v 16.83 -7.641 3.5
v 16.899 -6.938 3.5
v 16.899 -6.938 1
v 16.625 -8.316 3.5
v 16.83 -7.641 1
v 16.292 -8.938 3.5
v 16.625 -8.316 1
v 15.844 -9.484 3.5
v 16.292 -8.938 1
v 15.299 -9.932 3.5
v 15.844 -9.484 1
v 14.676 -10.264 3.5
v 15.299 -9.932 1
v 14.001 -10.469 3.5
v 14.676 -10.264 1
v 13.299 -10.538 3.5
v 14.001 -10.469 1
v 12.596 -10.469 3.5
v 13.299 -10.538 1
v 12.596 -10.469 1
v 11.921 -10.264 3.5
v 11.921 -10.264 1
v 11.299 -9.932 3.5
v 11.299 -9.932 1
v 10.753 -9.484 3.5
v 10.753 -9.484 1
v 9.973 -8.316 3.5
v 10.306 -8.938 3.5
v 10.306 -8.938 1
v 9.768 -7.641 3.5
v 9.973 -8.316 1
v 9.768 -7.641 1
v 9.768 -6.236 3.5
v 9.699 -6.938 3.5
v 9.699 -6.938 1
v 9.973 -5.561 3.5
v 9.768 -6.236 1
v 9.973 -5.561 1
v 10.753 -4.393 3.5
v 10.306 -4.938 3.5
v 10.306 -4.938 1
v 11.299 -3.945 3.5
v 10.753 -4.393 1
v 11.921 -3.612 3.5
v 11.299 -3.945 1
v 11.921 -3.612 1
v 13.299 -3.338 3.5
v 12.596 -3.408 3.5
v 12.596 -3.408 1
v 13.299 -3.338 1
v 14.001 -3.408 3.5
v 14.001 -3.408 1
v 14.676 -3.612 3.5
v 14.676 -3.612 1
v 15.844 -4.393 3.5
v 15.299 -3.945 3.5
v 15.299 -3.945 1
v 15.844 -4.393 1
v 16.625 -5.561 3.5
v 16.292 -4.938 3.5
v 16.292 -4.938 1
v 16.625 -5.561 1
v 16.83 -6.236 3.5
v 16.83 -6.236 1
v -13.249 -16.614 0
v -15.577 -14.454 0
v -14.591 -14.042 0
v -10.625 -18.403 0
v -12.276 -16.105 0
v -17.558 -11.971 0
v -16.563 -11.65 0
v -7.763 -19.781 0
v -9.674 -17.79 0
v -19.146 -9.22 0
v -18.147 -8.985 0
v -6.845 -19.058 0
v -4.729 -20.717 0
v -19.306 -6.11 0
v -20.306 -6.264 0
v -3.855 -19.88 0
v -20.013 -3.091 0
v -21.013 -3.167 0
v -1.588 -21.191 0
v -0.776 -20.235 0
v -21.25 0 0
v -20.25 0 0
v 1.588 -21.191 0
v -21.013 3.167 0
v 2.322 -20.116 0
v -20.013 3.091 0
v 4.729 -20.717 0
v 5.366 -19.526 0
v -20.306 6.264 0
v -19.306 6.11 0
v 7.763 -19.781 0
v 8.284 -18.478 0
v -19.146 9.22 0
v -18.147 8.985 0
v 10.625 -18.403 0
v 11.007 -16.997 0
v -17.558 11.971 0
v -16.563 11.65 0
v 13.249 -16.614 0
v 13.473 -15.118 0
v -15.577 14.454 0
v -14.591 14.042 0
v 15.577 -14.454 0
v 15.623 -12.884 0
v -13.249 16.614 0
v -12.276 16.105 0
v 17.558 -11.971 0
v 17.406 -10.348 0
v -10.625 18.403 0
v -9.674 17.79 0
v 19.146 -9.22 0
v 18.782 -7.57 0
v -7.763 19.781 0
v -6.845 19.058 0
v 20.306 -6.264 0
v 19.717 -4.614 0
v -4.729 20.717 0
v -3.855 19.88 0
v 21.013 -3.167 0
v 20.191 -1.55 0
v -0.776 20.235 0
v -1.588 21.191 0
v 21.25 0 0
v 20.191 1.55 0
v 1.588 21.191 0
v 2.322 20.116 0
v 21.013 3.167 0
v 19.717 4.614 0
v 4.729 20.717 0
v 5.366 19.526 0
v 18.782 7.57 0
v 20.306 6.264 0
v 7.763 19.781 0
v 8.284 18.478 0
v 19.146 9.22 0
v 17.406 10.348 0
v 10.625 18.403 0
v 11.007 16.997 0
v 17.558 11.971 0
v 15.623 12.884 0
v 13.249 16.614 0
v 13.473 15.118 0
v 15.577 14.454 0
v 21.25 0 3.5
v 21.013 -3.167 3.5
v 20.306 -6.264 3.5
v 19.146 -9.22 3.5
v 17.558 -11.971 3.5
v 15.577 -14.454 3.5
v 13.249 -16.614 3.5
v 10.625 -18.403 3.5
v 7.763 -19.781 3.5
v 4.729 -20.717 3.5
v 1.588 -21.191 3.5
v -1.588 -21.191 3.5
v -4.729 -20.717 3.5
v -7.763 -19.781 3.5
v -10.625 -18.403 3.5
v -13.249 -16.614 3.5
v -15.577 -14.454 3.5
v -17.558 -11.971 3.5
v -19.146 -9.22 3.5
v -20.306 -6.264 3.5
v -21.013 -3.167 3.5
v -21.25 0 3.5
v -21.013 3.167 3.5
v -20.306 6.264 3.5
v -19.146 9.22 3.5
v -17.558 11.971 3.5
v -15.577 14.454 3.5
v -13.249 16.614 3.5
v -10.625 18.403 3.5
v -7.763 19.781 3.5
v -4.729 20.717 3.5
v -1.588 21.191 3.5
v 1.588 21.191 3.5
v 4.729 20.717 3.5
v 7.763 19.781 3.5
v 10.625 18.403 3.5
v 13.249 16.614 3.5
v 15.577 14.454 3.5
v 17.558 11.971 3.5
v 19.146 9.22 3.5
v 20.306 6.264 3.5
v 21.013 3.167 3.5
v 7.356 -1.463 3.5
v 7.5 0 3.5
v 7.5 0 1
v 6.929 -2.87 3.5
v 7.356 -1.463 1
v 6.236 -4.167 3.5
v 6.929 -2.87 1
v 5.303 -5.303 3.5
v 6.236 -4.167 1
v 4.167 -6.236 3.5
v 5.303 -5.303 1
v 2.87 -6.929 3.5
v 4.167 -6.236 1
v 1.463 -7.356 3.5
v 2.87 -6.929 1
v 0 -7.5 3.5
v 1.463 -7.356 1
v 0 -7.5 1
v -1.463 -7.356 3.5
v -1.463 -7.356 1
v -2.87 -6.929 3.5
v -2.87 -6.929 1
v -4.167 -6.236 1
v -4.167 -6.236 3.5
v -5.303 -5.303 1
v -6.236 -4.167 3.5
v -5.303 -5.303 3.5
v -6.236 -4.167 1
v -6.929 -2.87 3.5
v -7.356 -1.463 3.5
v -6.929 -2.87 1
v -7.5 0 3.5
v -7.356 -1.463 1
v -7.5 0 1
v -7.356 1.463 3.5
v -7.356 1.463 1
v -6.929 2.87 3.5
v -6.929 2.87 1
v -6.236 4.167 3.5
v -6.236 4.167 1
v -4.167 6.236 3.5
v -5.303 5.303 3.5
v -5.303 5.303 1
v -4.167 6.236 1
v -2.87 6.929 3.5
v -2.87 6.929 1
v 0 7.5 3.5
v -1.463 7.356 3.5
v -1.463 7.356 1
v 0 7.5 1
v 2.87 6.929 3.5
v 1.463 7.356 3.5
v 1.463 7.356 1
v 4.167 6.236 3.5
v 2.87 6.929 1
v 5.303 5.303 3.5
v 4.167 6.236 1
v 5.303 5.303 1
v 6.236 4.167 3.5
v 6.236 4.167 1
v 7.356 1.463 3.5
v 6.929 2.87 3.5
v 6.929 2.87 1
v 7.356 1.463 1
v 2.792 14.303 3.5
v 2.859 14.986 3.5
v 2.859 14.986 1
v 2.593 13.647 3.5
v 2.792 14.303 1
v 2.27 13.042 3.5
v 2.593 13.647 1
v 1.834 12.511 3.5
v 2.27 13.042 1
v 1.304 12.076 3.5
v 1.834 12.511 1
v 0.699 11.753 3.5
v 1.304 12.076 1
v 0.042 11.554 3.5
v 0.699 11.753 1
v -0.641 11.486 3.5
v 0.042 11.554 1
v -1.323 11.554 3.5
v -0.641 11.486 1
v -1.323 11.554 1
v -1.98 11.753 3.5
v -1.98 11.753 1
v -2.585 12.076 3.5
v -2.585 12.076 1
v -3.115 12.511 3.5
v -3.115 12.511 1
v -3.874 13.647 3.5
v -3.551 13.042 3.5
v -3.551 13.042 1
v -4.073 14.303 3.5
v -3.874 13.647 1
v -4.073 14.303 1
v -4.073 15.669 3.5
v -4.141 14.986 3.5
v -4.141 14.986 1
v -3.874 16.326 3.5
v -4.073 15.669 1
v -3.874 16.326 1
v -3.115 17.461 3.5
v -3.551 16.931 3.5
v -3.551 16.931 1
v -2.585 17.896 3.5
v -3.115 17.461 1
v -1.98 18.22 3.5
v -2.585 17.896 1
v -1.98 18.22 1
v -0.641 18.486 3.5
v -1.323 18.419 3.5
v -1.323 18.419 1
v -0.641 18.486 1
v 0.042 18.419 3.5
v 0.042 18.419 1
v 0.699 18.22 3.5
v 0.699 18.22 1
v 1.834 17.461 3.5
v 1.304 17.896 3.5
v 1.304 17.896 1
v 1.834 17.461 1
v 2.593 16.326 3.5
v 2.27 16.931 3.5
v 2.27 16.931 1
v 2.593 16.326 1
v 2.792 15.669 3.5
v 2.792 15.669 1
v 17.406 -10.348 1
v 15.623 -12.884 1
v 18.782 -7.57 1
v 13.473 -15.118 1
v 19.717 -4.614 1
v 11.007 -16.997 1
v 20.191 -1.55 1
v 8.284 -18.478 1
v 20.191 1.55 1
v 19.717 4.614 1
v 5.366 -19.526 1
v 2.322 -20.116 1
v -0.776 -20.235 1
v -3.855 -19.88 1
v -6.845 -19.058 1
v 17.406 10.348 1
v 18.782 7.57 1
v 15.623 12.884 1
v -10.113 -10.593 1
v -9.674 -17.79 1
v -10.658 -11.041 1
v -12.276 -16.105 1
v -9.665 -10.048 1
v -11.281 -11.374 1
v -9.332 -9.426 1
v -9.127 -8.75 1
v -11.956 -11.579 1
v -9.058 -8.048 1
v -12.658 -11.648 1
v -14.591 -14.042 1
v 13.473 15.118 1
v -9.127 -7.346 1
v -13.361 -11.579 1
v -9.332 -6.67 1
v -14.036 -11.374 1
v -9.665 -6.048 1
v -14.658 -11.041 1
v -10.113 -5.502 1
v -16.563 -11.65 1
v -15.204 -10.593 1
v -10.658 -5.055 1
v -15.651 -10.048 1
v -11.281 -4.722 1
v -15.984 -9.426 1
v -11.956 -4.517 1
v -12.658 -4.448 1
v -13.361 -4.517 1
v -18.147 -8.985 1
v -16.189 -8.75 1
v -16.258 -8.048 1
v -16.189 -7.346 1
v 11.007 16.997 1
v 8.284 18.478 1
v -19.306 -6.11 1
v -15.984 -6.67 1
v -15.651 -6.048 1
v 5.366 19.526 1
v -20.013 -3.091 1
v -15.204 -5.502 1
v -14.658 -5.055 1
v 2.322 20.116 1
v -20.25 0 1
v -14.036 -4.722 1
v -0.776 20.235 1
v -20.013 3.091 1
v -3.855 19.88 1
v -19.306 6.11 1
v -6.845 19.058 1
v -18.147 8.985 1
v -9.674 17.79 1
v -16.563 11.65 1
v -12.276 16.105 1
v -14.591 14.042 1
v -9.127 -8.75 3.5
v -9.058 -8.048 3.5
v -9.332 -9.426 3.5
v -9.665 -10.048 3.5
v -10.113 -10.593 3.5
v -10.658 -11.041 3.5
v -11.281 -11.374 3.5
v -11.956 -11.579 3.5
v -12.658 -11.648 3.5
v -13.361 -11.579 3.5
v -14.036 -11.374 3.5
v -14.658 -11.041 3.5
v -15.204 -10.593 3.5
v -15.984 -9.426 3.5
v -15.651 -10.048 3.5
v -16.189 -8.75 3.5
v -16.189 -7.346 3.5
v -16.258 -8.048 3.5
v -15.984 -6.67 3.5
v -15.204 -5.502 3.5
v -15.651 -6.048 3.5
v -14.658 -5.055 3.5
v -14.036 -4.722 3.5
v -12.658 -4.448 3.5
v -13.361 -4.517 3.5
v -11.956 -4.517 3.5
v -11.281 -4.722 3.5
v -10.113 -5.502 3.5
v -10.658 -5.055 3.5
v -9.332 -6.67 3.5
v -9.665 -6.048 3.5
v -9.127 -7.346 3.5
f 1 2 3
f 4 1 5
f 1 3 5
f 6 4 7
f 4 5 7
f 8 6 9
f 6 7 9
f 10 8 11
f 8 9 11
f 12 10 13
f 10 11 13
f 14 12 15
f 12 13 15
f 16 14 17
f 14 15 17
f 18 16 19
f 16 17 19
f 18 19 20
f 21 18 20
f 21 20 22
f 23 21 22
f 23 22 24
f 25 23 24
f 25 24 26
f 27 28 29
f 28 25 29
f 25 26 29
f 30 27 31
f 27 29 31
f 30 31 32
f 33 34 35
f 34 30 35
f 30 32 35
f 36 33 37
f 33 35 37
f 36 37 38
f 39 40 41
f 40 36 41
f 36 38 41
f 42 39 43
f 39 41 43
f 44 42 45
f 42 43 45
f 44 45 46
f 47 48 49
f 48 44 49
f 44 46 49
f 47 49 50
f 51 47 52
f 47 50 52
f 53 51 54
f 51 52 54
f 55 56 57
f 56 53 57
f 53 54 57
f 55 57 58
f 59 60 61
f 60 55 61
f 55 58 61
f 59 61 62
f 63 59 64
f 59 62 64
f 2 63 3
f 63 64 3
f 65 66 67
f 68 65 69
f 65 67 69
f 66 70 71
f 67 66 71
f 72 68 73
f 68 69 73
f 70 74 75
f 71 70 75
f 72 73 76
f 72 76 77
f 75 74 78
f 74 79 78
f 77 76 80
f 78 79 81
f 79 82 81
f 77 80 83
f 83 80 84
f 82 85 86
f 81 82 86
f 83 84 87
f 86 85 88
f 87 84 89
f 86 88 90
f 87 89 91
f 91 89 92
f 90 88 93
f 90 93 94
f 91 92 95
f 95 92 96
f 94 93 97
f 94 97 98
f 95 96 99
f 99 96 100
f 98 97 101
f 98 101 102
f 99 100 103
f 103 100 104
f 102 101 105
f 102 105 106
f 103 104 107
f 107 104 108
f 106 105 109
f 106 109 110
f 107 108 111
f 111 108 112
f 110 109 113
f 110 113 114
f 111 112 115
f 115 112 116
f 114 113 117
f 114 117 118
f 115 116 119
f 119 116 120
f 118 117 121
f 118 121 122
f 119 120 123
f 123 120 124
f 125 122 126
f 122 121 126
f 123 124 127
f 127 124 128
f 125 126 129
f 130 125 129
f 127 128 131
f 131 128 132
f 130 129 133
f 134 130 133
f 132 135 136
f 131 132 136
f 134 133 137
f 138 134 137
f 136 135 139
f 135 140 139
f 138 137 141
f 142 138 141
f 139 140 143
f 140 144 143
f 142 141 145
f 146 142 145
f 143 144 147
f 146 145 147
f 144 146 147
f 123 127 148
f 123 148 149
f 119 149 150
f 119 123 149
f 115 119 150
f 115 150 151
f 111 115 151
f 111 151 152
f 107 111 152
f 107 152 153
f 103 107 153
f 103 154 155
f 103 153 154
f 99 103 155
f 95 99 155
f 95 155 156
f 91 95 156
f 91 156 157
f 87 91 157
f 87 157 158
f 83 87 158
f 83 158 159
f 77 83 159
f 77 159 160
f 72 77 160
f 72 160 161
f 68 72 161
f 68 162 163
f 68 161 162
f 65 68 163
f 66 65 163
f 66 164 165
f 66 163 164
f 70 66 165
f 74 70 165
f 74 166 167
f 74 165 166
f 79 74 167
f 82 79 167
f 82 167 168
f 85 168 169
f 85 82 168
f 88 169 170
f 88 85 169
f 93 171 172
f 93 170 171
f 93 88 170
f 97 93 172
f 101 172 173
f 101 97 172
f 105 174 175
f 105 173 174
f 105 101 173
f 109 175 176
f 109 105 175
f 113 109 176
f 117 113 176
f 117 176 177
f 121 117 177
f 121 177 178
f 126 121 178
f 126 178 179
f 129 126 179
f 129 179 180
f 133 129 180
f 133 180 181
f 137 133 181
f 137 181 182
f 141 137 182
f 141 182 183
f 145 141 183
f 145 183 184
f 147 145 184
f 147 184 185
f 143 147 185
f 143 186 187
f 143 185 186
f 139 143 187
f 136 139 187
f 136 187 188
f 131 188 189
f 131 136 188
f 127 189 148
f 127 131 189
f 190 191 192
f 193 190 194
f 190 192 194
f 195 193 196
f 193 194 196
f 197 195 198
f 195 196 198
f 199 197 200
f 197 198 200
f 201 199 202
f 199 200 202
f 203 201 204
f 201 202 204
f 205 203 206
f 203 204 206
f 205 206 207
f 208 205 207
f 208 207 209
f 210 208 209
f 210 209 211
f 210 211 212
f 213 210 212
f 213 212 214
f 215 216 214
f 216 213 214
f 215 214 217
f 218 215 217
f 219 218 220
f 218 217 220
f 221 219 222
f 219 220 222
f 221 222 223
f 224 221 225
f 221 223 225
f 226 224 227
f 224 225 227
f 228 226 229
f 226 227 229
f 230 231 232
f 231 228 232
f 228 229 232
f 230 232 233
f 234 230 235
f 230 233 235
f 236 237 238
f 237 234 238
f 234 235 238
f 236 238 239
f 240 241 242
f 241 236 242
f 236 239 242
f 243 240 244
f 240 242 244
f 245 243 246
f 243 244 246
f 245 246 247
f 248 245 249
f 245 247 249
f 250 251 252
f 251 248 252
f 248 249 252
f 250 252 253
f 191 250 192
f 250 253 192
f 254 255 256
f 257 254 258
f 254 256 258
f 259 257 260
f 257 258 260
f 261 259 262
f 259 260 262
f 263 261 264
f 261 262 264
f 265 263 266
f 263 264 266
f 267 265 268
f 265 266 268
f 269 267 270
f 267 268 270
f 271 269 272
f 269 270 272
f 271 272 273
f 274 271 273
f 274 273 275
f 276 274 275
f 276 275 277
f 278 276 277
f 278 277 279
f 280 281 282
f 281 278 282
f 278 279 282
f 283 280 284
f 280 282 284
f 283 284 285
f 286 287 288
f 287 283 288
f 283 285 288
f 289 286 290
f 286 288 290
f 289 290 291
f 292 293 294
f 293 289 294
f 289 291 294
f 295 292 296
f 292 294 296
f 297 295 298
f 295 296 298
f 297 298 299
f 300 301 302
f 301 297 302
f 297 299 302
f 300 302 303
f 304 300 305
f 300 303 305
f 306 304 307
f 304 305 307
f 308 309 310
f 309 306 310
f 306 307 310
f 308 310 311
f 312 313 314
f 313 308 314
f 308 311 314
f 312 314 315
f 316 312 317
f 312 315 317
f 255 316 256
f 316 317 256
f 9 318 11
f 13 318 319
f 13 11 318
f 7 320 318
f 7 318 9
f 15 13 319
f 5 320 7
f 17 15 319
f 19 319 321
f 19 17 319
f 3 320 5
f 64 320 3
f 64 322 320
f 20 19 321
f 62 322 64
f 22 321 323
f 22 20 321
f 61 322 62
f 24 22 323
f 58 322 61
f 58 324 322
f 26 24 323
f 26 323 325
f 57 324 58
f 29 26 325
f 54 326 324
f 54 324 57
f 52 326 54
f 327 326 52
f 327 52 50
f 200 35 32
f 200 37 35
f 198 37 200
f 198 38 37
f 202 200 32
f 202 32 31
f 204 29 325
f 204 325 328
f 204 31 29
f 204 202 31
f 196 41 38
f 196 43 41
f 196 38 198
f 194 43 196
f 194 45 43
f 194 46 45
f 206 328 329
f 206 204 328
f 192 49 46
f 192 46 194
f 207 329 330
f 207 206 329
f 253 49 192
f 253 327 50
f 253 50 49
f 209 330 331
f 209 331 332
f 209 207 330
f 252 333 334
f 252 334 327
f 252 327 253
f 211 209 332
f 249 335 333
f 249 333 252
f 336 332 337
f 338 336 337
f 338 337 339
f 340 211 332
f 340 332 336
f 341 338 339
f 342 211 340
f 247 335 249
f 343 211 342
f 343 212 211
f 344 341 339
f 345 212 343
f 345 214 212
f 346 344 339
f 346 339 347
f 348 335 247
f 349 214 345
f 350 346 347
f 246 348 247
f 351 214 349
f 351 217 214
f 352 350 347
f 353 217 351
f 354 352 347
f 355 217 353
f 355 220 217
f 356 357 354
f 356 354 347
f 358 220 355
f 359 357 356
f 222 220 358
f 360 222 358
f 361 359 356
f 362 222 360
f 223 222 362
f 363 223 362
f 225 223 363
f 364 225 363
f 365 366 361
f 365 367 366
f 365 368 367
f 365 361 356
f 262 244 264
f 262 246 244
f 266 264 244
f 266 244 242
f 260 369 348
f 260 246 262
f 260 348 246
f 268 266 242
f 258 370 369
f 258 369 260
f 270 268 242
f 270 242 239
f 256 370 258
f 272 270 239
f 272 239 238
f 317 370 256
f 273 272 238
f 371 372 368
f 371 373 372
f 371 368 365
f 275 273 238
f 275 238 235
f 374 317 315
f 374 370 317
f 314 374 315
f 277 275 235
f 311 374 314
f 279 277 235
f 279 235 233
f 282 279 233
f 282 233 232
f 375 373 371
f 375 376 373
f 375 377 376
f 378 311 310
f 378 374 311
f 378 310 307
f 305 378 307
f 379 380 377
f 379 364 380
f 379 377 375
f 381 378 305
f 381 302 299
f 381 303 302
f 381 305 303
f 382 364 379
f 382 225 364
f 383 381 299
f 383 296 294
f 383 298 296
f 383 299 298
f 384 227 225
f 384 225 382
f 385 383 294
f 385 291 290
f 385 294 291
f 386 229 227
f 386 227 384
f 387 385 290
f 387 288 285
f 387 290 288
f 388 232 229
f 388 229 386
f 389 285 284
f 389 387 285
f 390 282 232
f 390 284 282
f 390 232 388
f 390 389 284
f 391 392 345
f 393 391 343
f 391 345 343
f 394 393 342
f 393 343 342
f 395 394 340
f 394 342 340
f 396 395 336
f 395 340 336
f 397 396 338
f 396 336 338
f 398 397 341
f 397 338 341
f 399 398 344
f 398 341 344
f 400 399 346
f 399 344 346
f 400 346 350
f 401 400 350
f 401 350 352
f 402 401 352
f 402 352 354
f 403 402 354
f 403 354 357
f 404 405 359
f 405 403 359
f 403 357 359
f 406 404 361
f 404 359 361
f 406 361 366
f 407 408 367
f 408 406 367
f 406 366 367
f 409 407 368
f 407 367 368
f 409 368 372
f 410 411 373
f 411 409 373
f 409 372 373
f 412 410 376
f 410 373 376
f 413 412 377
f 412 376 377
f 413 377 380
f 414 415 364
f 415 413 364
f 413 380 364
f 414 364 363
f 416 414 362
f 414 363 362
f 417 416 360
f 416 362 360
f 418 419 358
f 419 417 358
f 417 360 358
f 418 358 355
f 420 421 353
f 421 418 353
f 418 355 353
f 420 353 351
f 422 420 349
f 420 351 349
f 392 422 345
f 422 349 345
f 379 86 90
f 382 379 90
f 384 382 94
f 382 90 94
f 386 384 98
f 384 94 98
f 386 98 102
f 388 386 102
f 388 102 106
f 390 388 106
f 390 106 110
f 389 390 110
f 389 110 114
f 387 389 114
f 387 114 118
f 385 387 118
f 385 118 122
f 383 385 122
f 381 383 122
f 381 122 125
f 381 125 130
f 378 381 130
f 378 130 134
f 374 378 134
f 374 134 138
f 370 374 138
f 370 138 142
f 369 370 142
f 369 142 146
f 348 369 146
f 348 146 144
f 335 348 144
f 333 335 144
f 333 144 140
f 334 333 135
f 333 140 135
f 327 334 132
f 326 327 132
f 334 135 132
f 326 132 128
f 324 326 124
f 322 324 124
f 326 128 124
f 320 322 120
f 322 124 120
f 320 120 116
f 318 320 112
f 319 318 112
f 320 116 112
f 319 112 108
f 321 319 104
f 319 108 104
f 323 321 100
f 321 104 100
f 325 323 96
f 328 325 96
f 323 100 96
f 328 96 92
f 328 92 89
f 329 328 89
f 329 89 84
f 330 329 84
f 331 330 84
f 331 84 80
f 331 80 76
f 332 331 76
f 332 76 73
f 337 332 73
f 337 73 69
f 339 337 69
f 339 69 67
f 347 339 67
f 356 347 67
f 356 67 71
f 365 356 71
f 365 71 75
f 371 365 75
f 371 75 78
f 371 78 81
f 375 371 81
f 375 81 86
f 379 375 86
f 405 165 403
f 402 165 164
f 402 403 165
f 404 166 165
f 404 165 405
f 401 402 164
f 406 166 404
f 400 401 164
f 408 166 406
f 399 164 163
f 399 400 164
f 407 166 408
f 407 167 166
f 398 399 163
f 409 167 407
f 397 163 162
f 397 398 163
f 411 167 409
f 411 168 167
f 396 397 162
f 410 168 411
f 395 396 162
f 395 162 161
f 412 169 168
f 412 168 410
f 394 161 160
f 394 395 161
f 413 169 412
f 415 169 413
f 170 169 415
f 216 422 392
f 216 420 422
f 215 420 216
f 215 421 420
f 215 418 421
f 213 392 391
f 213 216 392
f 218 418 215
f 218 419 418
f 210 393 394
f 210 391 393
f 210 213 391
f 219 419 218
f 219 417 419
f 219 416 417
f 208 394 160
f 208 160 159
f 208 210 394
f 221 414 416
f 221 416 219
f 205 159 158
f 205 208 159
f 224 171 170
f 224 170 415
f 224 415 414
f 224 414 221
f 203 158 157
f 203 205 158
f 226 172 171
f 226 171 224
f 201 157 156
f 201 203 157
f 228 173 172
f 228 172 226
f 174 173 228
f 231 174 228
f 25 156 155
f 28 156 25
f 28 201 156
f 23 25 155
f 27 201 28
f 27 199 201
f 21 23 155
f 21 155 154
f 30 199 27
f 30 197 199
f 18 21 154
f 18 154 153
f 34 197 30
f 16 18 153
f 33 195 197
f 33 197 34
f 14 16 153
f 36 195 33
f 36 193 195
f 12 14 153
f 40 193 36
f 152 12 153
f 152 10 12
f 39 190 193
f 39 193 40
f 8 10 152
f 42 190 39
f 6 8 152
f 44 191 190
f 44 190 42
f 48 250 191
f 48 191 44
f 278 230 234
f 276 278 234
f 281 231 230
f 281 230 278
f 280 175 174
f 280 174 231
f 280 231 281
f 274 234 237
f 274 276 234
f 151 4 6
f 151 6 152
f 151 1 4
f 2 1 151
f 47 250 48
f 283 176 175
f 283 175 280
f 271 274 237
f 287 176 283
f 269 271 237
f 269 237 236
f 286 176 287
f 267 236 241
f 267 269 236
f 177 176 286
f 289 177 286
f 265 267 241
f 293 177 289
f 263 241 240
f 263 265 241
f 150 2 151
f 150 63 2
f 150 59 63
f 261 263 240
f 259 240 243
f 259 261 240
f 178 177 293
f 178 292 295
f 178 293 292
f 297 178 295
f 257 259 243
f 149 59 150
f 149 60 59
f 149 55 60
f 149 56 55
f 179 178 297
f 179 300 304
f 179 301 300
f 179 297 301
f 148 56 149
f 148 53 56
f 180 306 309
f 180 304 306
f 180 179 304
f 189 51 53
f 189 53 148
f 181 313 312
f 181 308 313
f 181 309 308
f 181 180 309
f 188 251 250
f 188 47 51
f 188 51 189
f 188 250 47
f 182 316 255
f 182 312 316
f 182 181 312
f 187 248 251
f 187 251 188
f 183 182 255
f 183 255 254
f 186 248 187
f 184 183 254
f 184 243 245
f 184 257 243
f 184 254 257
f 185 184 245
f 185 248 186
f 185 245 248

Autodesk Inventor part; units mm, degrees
ref_plane "YZ Plane" through (0, 0, 0) normal (1, 0, 0) x (0, 1, 0)
ref_plane "XZ Plane" through (0, 0, 0) normal (0, 1, 0) x (-1, 0, 0)
ref_plane "XY Plane" through (0, 0, 0) normal (0, 0, 1) x (1, 0, 0)
sketch "Sketch1" plane through (0, 0, 0) normal (0, 0, 1) x (1, 0, 0)
  circle A0 centre (13.2988, -6.9384) radius 3.6
  circle A1 centre (-12.6582, -8.0479) radius 3.6
  circle A2 centre (-0.6406, 14.9863) radius 3.5
  circle A3 centre (0, 0) radius 7.5
  circle A4 centre (0, 0) radius 21.25
  point P0 (0, 0)
  dimension "d11" = 42.5
extrude "Extrusion1" add sketch "Sketch1" along normal blind 3.5
sketch "Sketch3" plane through (0, 0, 0) normal (0, 0, -1) x (-1, 0, 0)
  circle A0 centre (0, 0) radius 20.25
  dimension "d14" = 40.5
extrude "Extrusion4" cut sketch "Sketch3" against normal blind 1
properties part number "Inner disc of housing of gearbox"
